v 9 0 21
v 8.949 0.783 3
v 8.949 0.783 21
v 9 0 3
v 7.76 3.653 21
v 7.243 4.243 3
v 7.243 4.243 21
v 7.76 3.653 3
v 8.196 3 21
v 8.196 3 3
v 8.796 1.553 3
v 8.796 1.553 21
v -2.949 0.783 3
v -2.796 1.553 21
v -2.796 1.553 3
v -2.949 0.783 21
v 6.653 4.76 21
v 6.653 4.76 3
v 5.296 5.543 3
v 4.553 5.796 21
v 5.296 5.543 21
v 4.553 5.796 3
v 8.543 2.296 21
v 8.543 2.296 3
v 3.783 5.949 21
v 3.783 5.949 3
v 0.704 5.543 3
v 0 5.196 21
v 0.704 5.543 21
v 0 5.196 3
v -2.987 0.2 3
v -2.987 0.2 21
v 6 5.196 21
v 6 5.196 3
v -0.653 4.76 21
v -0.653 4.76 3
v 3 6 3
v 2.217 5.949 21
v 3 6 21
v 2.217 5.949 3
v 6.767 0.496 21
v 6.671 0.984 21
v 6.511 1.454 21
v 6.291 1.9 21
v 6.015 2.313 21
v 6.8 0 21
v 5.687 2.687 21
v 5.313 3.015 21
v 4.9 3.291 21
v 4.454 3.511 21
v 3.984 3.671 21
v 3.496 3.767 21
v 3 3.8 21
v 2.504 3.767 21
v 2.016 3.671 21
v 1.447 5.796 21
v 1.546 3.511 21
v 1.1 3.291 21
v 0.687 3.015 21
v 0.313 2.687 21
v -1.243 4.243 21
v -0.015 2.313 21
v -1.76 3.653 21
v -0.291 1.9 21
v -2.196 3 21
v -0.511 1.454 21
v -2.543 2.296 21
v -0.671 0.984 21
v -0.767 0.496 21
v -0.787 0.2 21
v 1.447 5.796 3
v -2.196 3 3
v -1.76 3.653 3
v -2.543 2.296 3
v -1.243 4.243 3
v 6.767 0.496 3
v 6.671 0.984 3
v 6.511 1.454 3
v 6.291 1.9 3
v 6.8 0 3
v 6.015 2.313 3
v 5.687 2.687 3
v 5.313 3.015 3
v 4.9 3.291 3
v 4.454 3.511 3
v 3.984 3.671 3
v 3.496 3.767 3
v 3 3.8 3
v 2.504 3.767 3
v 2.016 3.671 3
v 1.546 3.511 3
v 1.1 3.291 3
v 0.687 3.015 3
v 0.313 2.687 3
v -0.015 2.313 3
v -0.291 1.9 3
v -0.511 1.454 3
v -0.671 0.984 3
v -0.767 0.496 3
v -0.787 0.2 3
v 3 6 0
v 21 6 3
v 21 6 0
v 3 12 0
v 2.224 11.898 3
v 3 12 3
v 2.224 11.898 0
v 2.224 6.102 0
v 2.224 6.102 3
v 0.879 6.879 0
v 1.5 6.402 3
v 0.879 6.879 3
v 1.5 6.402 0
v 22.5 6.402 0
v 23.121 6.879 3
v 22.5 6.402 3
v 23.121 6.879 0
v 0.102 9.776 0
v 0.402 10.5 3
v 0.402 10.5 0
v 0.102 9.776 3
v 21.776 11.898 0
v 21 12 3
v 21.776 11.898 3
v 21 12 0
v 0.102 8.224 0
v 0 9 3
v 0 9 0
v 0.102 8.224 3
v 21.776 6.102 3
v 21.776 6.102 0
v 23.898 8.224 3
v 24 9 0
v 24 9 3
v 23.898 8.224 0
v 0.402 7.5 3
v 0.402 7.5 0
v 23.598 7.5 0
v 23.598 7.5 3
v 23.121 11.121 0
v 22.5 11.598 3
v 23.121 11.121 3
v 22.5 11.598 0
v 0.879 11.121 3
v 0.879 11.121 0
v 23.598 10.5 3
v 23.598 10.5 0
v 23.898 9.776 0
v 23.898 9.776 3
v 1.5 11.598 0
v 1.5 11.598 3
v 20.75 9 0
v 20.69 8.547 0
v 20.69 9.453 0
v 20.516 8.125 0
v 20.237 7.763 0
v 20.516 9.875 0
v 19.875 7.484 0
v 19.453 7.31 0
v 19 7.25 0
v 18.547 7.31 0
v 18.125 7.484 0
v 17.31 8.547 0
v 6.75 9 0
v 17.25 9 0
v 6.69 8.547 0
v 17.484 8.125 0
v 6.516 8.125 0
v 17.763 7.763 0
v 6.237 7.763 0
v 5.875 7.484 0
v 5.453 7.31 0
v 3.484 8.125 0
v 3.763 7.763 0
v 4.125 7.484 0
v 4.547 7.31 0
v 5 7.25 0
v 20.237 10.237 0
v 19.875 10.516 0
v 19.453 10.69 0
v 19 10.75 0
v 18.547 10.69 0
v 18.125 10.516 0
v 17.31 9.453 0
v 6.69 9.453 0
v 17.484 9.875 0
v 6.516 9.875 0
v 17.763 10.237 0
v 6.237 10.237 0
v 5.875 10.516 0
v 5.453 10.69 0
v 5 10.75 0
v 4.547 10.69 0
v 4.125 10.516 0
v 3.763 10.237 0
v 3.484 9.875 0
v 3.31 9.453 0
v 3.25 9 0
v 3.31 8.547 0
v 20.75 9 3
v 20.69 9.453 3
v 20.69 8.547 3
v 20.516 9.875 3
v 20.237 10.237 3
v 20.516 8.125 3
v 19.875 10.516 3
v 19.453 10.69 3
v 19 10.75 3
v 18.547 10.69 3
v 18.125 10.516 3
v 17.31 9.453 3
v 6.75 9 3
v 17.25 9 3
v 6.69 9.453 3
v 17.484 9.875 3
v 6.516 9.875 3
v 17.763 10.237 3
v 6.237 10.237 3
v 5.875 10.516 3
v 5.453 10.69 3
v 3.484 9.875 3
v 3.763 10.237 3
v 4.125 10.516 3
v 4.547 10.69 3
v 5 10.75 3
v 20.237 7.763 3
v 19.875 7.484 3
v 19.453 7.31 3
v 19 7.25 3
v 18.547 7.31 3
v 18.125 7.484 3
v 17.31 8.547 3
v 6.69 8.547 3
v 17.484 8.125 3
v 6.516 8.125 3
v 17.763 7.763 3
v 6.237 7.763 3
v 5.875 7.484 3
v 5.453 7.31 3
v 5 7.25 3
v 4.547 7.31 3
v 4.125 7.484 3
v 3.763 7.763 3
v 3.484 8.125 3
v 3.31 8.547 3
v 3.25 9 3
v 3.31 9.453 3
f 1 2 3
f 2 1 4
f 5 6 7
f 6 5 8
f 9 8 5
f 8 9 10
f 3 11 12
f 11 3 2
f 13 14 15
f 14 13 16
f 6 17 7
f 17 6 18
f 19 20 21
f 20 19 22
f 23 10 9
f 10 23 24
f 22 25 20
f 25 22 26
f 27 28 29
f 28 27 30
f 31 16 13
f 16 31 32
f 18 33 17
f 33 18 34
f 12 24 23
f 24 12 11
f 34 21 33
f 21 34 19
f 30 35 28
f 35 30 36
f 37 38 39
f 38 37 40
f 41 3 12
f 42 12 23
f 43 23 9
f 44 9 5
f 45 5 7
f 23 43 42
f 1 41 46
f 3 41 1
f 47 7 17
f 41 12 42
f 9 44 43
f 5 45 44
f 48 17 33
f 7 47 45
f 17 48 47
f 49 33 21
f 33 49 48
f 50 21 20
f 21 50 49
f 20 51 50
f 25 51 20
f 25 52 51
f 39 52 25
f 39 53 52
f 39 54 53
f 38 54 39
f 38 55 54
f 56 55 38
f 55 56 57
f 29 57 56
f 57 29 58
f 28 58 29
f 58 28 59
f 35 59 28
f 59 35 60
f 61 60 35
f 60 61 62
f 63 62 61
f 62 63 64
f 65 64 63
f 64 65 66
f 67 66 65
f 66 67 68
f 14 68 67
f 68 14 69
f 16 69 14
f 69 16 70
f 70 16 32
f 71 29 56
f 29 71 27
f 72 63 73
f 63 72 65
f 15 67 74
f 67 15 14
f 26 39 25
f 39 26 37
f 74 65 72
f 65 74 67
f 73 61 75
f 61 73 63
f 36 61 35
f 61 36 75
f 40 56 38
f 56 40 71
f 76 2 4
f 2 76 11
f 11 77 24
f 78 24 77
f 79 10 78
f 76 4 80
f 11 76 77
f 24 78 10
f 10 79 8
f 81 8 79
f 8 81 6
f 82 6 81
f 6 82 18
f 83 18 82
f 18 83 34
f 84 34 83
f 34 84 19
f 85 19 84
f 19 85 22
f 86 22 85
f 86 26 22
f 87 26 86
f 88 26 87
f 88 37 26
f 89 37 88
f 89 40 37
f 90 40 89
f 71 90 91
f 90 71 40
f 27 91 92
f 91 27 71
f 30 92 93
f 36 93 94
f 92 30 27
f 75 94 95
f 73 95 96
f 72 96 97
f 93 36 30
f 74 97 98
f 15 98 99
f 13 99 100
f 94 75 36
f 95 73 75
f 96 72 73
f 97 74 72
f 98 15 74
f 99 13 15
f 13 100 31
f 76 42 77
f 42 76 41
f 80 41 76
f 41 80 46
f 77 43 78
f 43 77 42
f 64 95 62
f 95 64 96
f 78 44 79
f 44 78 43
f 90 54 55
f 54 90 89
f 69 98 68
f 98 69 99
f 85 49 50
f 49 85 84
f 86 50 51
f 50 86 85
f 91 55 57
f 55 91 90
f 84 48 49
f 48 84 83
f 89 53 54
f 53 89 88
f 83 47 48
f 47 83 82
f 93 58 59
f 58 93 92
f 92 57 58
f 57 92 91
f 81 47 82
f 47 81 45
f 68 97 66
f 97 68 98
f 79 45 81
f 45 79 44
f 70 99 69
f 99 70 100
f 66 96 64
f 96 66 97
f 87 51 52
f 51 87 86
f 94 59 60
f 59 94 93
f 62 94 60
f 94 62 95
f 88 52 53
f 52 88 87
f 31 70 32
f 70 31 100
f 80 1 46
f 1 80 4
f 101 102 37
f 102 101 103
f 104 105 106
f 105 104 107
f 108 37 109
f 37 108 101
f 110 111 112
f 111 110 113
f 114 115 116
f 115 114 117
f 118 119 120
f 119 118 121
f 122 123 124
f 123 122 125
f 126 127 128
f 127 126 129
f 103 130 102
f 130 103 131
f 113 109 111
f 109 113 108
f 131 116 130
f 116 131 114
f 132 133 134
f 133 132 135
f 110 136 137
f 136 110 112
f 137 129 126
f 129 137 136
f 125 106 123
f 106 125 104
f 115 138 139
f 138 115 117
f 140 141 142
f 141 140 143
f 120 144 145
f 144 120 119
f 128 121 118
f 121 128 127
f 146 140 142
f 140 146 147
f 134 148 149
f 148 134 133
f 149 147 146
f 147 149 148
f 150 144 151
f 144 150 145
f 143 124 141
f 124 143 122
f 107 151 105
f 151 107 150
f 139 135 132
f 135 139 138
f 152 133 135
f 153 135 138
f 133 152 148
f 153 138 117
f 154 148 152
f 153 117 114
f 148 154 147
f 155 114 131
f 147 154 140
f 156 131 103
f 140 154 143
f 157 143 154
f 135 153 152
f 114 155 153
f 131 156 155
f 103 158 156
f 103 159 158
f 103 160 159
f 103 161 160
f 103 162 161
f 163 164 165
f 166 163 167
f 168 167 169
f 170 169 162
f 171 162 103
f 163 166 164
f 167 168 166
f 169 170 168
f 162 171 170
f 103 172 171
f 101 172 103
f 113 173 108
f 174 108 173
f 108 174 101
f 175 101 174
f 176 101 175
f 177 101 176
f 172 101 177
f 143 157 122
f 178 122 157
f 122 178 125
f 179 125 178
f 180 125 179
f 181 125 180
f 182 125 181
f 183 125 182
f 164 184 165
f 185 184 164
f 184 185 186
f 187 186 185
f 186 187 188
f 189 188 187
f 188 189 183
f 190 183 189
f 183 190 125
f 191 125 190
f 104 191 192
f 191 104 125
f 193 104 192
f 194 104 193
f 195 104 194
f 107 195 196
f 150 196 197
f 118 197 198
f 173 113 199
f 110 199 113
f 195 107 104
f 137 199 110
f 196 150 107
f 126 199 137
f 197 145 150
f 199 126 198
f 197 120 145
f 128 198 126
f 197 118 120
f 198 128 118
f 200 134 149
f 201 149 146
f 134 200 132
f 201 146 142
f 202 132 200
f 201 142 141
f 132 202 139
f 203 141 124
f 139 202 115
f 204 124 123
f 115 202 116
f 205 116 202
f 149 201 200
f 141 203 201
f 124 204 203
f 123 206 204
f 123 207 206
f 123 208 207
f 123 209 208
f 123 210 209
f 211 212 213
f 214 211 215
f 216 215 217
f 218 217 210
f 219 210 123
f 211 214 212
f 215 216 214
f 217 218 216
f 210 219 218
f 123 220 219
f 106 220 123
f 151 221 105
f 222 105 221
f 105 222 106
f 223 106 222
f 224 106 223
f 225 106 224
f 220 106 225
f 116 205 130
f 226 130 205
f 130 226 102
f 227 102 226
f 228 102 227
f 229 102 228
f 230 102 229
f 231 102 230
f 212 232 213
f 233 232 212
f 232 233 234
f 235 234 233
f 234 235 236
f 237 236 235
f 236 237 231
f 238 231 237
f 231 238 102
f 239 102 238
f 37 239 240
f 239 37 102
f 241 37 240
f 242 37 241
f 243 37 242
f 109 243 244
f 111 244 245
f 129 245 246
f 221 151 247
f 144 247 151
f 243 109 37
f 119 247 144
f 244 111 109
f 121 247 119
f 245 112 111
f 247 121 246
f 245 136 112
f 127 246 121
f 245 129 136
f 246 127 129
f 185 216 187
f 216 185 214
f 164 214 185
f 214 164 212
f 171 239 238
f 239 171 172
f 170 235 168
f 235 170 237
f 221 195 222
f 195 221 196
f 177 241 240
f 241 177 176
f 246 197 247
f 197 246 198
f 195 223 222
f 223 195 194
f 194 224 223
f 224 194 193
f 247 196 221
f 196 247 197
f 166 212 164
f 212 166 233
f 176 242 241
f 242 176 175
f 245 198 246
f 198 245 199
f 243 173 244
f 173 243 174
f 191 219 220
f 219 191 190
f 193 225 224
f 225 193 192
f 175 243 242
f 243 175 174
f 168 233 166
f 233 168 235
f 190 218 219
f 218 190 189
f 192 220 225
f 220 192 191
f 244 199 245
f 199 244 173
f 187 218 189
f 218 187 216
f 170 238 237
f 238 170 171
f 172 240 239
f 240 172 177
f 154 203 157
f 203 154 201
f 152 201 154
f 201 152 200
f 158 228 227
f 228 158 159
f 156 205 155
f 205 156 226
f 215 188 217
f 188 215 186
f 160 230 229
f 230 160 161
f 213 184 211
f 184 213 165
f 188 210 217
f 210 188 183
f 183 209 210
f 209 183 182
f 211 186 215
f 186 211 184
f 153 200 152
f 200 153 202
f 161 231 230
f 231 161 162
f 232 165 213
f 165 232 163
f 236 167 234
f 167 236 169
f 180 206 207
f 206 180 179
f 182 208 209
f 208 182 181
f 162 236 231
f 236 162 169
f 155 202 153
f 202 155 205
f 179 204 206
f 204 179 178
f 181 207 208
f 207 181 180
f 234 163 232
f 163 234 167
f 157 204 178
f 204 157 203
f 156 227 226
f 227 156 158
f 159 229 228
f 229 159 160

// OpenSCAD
// ============================================================
// Cable Management Clip — Wall / Desk Adhesive Mount
// ============================================================
// Holds cables against a surface. Print multiple, press-fit cable.
// Sized for common cable diameters (USB-C, HDMI, power).

// ---- PARAMETERS ----
cable_dia   = 7;    // Cable outer diameter (mm). USB-C ~4.5mm, HDMI ~8mm, power ~7mm
clip_w      = 18;   // Width of the clip (mm)
base_t      = 3;    // Base plate thickness (mm)
base_l      = 24;   // Base plate length (mm)
arm_t       = 2.5;  // Clip arm thickness (mm)
arm_gap     = 0.4;  // Gap between arms for cable snap-in (press-fit clearance)
screw_d     = 3.5;  // Screw hole diameter (3M screw / M3 = 3.5mm clearance)

// ---- DERIVED ----
cr = cable_dia / 2;       // Cable radius
inner_r = cr + 0.3;       // Inner channel radius (slight clearance)
outer_r = cr + arm_t;     // Outer radius of the clip

// ---- BASE PLATE ----
module base_plate() {
    hull() {
        for (x = [3, base_l - 3])
            translate([x, clip_w/2, 0]) cylinder(r=3, h=base_t, $fn=24);
    }
}

// ---- SCREW HOLES ----
module screw_holes() {
    for (x = [5, base_l - 5])
        translate([x, clip_w/2, -0.1])
            cylinder(d=screw_d, h=base_t + 0.2, $fn=24);
}

// ---- CLIP ARMS ----
module clip_arms() {
    // Two arms form a C-shape to grip the cable
    // Bottom arm (solid)
    translate([base_l/2 - clip_w/2, 0, base_t])
    difference() {
        cylinder(r=outer_r, h=clip_w, $fn=48, center=false);
        // Inner channel
        translate([0, 0, -0.1]) cylinder(r=inner_r, h=clip_w + 0.2, $fn=48);
        // Open top gap for cable insertion
        translate([-outer_r - 0.1, -arm_gap/2, -0.1])
            cube([outer_r + 0.1, arm_gap, clip_w + 0.2]);
        // Cut lower half so it's a C not an O
        translate([-outer_r - 0.1, -outer_r - 0.1, -0.1])
            cube([outer_r * 2 + 0.2, outer_r + 0.1, clip_w + 0.2]);
    }
}

// ---- ASSEMBLE ----
difference() {
    union() {
        base_plate();
        clip_arms();
    }
    screw_holes();
}
